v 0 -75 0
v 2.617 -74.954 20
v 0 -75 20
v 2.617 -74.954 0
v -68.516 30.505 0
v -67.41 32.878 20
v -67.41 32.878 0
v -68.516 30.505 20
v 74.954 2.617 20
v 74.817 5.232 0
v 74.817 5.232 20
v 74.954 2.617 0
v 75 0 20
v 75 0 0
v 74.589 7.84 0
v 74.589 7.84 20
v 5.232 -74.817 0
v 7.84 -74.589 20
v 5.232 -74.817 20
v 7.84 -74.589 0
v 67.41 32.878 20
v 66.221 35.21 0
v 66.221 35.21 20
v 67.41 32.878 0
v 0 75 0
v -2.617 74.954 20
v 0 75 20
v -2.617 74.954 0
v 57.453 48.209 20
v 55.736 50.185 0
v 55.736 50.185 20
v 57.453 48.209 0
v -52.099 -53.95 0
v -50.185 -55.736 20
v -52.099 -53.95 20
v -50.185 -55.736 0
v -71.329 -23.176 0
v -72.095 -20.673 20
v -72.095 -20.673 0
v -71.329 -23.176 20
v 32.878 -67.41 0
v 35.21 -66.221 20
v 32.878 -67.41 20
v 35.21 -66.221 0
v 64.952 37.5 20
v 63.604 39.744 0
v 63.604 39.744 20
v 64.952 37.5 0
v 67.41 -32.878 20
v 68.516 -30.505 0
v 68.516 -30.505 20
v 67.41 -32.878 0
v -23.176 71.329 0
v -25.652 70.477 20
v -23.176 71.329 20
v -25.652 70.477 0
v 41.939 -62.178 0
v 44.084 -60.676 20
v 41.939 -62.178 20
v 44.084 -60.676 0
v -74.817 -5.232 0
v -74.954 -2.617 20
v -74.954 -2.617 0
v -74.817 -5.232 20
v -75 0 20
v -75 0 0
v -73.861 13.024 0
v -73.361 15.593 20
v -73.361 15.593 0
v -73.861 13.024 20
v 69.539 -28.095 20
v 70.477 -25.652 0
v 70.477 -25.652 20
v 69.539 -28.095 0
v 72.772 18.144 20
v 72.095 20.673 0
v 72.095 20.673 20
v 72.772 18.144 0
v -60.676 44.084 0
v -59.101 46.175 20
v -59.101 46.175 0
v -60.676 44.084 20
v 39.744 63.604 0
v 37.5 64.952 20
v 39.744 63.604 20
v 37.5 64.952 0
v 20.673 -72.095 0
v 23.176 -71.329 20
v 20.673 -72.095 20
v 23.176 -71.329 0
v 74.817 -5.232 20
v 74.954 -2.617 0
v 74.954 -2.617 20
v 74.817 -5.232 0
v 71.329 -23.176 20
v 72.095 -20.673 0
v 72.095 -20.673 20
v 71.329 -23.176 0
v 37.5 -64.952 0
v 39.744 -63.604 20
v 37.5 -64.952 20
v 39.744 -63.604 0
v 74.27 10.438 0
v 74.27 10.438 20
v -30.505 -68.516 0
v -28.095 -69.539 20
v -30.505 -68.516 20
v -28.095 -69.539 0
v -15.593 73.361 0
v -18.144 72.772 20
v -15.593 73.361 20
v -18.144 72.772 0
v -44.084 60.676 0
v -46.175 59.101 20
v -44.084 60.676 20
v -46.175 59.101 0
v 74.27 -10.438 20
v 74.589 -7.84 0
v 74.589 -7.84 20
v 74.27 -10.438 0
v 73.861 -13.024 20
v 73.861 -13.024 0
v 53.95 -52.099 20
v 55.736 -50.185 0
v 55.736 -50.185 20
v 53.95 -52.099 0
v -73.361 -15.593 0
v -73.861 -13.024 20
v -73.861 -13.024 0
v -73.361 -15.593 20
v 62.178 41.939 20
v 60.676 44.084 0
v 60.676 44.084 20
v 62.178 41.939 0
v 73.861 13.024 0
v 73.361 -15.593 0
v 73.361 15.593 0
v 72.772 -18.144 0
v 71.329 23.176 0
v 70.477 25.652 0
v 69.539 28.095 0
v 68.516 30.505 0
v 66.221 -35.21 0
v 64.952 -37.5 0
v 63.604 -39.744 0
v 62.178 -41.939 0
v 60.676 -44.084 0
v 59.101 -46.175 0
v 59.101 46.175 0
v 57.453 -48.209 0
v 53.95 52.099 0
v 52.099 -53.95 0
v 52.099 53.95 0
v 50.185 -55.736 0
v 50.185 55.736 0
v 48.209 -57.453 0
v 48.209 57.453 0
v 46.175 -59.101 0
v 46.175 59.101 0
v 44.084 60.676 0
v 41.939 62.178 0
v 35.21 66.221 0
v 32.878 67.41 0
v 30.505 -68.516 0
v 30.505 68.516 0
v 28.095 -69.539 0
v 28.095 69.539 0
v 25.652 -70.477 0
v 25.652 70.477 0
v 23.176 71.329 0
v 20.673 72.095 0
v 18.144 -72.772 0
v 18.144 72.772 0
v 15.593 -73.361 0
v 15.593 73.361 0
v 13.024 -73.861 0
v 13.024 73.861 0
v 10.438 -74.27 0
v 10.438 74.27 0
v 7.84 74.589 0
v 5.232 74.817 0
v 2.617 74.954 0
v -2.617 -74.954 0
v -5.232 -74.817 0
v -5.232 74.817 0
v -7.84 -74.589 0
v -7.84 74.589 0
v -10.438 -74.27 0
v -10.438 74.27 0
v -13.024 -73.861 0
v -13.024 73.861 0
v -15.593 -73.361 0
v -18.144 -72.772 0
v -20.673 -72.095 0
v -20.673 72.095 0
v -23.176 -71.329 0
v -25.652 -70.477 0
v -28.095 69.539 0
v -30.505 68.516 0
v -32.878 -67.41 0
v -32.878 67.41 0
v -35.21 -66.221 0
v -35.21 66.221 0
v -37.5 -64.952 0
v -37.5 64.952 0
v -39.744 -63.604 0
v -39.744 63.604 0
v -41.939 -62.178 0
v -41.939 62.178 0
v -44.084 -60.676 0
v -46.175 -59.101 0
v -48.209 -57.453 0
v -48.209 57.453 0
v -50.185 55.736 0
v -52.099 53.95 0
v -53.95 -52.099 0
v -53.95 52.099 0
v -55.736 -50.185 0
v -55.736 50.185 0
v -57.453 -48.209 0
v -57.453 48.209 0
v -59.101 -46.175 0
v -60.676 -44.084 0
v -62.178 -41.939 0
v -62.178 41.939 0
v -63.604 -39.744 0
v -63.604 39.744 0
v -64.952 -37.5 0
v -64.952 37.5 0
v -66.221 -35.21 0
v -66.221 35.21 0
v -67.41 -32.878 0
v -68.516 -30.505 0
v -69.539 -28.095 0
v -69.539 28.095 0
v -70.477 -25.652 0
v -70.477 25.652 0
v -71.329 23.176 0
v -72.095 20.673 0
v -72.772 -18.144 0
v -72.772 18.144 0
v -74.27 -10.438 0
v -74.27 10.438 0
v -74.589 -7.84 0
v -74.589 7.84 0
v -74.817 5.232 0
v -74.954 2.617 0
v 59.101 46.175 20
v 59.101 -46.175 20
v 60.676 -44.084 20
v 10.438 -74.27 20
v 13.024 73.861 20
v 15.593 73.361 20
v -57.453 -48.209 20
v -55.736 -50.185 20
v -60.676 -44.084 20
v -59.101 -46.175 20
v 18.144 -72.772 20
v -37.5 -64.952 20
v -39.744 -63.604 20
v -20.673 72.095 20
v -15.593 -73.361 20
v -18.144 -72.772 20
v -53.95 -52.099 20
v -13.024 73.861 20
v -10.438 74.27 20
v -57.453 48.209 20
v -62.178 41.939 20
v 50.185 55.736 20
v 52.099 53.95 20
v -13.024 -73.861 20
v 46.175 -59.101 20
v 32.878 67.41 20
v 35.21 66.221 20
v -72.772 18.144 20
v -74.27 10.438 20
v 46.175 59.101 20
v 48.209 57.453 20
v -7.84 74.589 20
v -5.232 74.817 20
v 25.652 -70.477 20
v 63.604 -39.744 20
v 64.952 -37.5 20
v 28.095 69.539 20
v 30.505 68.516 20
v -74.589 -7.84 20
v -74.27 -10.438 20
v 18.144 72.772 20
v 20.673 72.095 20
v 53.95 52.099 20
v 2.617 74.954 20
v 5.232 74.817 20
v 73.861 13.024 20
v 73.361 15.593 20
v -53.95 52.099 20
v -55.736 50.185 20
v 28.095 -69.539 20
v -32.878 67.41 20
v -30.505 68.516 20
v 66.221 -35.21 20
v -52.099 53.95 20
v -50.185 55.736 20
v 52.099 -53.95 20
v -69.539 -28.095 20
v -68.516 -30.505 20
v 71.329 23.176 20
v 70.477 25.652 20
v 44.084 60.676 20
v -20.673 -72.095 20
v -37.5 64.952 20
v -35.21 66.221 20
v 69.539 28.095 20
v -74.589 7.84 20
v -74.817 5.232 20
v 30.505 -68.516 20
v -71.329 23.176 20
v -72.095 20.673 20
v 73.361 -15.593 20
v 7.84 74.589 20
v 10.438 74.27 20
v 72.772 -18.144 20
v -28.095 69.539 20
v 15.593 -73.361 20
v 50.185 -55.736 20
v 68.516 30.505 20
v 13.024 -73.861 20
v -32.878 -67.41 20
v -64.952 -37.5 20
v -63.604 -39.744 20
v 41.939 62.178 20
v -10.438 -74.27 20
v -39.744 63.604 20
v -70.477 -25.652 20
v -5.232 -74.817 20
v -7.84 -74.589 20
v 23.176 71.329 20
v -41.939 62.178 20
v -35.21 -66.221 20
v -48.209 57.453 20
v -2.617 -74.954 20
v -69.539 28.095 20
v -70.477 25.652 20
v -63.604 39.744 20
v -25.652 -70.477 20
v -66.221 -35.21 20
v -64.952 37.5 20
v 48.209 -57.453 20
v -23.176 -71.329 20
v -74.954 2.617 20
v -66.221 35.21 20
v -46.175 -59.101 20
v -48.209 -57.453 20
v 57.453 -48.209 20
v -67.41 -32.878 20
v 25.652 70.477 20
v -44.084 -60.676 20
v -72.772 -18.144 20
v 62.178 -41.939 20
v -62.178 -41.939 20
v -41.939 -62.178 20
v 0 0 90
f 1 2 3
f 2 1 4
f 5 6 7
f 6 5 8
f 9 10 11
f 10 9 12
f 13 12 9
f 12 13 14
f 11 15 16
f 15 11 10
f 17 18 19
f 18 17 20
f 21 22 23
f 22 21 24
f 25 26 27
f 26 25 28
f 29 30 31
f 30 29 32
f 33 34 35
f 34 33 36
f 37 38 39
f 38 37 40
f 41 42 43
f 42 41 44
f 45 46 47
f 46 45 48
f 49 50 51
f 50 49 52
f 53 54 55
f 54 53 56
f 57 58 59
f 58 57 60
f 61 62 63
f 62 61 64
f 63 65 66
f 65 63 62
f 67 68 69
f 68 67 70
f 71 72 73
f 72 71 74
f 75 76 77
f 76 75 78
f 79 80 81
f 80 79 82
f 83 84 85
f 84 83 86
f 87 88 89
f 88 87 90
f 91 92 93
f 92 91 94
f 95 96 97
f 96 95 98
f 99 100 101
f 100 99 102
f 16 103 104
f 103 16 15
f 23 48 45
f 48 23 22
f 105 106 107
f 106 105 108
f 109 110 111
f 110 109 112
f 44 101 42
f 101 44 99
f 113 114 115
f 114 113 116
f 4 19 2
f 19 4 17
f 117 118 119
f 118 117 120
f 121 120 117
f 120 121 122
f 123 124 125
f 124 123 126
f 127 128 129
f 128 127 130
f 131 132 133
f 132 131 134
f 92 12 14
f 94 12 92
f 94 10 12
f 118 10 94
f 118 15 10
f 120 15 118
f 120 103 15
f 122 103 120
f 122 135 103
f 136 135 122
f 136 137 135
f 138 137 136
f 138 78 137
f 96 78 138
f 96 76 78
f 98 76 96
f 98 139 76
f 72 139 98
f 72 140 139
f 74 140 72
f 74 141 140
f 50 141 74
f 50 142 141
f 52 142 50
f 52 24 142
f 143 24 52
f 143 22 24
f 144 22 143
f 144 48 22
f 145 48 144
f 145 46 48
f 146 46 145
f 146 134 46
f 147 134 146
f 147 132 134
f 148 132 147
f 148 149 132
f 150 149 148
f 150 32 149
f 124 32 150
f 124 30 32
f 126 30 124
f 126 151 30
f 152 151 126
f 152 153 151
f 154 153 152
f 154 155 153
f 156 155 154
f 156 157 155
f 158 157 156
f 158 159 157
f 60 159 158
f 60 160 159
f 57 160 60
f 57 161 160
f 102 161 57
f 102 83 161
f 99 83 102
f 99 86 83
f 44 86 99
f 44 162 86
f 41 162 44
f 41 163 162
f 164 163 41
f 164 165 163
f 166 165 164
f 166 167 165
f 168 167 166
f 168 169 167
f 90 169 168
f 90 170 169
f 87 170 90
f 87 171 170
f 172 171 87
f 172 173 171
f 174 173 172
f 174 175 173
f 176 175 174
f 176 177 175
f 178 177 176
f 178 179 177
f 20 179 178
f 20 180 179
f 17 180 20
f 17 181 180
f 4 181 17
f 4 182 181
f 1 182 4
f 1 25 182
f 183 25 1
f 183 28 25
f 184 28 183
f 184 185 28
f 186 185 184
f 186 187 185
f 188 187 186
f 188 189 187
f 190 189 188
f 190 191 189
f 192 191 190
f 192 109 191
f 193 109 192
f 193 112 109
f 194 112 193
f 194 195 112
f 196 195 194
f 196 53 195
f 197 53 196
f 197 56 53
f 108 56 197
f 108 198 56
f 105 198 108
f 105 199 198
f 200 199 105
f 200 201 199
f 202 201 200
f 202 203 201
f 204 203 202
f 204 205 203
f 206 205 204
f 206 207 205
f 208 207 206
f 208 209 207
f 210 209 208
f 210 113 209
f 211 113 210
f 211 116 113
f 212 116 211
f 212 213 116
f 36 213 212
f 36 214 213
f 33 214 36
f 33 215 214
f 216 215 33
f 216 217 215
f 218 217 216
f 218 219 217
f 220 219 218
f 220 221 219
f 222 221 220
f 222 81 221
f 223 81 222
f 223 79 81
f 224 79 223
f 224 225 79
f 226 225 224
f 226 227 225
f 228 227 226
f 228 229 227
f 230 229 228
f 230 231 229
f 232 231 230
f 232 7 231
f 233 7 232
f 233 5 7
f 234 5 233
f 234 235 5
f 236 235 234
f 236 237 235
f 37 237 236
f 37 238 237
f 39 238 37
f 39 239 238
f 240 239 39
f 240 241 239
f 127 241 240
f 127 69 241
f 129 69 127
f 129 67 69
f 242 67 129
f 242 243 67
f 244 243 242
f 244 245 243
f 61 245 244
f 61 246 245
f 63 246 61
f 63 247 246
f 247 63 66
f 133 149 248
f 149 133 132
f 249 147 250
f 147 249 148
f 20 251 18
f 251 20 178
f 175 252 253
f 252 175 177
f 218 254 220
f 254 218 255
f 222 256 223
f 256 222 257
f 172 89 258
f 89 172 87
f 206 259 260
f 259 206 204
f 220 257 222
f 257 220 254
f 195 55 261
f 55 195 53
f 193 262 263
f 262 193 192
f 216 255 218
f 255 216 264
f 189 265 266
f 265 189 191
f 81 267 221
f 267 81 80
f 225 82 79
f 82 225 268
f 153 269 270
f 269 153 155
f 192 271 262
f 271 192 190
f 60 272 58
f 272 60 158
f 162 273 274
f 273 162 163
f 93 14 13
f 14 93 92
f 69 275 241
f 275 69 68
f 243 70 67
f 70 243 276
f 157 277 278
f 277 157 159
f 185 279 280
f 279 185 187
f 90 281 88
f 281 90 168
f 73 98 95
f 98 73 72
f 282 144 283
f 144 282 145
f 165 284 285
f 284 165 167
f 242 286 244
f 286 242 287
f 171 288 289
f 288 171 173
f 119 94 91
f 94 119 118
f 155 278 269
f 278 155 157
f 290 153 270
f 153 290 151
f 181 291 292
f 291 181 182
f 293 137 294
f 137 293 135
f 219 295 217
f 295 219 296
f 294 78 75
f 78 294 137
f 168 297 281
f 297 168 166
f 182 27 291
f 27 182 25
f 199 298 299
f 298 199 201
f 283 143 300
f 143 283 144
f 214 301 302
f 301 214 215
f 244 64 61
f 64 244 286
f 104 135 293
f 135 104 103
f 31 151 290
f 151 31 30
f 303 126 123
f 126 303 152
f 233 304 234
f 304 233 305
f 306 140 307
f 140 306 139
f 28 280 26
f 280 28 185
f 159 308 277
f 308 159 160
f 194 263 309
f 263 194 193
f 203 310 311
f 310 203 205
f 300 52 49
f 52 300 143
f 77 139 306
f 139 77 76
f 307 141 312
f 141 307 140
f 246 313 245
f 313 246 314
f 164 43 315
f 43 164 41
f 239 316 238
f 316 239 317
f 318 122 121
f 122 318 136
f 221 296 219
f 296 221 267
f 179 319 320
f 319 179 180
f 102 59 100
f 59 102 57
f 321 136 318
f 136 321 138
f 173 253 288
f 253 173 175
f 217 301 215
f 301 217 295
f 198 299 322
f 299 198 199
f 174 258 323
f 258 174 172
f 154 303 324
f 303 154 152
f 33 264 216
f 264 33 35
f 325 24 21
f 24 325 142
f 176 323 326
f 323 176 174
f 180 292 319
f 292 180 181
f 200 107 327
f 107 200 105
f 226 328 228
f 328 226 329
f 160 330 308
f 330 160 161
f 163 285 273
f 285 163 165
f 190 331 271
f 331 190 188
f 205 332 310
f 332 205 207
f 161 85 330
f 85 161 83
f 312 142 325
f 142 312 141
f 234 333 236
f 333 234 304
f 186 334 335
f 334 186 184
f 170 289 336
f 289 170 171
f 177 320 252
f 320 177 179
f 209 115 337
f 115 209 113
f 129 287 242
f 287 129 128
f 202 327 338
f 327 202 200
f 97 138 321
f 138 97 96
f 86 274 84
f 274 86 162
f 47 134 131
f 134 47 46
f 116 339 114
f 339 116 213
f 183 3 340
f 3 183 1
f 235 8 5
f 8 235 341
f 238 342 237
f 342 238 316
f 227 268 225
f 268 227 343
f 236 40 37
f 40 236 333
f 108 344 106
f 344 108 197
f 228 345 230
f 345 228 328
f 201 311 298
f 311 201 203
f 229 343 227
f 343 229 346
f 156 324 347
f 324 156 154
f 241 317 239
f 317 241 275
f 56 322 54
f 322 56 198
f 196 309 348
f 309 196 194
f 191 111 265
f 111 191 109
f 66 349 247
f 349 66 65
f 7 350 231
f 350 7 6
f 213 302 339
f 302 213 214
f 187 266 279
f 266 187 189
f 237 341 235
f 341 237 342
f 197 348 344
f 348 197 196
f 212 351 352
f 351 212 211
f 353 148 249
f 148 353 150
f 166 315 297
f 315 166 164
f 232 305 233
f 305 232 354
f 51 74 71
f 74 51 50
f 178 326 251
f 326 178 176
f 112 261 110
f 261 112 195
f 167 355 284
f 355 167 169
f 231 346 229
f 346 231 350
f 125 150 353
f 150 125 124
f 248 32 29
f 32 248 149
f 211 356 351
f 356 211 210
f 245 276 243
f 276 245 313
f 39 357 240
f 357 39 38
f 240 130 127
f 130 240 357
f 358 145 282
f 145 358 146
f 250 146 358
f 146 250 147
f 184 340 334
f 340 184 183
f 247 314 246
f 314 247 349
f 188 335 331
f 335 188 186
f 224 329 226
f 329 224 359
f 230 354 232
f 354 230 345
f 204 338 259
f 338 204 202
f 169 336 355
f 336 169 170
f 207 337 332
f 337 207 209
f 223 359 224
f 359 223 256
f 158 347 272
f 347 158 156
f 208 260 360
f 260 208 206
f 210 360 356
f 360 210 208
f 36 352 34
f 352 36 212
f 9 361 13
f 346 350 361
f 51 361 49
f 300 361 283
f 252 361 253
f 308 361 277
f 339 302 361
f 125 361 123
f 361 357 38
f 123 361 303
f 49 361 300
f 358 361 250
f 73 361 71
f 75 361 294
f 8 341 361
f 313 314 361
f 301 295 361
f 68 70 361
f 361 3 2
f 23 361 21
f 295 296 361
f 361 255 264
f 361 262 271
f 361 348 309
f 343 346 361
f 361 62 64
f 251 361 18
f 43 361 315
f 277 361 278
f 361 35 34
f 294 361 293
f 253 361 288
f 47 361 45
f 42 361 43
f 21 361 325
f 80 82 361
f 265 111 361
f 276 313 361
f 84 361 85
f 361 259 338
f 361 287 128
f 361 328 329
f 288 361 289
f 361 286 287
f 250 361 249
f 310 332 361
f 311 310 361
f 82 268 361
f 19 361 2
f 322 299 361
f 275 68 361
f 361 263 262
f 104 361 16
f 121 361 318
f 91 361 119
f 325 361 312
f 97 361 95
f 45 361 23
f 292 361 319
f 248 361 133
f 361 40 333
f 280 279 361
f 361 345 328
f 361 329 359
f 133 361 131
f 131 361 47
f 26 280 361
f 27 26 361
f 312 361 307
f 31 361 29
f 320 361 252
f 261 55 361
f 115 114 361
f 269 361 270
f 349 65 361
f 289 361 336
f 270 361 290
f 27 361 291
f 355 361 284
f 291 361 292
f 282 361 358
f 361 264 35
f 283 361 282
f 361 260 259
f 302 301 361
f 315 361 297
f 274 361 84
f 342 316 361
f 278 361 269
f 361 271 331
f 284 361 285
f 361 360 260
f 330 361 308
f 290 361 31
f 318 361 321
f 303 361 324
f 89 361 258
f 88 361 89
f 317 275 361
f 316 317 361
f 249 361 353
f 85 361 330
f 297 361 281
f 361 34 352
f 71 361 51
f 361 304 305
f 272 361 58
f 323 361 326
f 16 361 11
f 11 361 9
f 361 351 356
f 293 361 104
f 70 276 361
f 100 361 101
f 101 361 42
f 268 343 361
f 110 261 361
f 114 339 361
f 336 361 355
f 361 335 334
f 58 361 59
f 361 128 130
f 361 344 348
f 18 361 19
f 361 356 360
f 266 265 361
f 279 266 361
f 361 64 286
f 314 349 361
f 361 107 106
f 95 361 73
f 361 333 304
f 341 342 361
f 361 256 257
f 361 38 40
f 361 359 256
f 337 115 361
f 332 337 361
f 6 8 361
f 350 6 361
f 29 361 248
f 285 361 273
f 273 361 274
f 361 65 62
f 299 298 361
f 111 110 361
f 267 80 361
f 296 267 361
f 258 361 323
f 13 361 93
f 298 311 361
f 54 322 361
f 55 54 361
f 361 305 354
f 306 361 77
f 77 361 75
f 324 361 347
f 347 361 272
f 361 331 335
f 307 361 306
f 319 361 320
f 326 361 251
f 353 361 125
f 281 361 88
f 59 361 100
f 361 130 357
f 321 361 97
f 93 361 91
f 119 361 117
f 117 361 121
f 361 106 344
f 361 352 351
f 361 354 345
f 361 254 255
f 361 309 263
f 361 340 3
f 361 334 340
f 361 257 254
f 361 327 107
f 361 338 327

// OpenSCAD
// =============================================================================
//  ROOF -- the carousel's hat on its own: Ø15 cm brim, 2 cm, with a 7 cm cone
// =============================================================================
//  The same part as the brim and roof cone in cake_mockup.scad, standing on
//  Z 0. Its sizes (brim_d, brim_h, roof_d, roof_h) live in cake_mockup.scad,
//  so the two never disagree: edit them there. Three are needed.
//
//      openscad roof.scad
//      openscad -o roof.stl roof.scad
// =============================================================================

include <cake_mockup.scad>

part = "roof";   // overrides the include's "stack": the last assignment wins
